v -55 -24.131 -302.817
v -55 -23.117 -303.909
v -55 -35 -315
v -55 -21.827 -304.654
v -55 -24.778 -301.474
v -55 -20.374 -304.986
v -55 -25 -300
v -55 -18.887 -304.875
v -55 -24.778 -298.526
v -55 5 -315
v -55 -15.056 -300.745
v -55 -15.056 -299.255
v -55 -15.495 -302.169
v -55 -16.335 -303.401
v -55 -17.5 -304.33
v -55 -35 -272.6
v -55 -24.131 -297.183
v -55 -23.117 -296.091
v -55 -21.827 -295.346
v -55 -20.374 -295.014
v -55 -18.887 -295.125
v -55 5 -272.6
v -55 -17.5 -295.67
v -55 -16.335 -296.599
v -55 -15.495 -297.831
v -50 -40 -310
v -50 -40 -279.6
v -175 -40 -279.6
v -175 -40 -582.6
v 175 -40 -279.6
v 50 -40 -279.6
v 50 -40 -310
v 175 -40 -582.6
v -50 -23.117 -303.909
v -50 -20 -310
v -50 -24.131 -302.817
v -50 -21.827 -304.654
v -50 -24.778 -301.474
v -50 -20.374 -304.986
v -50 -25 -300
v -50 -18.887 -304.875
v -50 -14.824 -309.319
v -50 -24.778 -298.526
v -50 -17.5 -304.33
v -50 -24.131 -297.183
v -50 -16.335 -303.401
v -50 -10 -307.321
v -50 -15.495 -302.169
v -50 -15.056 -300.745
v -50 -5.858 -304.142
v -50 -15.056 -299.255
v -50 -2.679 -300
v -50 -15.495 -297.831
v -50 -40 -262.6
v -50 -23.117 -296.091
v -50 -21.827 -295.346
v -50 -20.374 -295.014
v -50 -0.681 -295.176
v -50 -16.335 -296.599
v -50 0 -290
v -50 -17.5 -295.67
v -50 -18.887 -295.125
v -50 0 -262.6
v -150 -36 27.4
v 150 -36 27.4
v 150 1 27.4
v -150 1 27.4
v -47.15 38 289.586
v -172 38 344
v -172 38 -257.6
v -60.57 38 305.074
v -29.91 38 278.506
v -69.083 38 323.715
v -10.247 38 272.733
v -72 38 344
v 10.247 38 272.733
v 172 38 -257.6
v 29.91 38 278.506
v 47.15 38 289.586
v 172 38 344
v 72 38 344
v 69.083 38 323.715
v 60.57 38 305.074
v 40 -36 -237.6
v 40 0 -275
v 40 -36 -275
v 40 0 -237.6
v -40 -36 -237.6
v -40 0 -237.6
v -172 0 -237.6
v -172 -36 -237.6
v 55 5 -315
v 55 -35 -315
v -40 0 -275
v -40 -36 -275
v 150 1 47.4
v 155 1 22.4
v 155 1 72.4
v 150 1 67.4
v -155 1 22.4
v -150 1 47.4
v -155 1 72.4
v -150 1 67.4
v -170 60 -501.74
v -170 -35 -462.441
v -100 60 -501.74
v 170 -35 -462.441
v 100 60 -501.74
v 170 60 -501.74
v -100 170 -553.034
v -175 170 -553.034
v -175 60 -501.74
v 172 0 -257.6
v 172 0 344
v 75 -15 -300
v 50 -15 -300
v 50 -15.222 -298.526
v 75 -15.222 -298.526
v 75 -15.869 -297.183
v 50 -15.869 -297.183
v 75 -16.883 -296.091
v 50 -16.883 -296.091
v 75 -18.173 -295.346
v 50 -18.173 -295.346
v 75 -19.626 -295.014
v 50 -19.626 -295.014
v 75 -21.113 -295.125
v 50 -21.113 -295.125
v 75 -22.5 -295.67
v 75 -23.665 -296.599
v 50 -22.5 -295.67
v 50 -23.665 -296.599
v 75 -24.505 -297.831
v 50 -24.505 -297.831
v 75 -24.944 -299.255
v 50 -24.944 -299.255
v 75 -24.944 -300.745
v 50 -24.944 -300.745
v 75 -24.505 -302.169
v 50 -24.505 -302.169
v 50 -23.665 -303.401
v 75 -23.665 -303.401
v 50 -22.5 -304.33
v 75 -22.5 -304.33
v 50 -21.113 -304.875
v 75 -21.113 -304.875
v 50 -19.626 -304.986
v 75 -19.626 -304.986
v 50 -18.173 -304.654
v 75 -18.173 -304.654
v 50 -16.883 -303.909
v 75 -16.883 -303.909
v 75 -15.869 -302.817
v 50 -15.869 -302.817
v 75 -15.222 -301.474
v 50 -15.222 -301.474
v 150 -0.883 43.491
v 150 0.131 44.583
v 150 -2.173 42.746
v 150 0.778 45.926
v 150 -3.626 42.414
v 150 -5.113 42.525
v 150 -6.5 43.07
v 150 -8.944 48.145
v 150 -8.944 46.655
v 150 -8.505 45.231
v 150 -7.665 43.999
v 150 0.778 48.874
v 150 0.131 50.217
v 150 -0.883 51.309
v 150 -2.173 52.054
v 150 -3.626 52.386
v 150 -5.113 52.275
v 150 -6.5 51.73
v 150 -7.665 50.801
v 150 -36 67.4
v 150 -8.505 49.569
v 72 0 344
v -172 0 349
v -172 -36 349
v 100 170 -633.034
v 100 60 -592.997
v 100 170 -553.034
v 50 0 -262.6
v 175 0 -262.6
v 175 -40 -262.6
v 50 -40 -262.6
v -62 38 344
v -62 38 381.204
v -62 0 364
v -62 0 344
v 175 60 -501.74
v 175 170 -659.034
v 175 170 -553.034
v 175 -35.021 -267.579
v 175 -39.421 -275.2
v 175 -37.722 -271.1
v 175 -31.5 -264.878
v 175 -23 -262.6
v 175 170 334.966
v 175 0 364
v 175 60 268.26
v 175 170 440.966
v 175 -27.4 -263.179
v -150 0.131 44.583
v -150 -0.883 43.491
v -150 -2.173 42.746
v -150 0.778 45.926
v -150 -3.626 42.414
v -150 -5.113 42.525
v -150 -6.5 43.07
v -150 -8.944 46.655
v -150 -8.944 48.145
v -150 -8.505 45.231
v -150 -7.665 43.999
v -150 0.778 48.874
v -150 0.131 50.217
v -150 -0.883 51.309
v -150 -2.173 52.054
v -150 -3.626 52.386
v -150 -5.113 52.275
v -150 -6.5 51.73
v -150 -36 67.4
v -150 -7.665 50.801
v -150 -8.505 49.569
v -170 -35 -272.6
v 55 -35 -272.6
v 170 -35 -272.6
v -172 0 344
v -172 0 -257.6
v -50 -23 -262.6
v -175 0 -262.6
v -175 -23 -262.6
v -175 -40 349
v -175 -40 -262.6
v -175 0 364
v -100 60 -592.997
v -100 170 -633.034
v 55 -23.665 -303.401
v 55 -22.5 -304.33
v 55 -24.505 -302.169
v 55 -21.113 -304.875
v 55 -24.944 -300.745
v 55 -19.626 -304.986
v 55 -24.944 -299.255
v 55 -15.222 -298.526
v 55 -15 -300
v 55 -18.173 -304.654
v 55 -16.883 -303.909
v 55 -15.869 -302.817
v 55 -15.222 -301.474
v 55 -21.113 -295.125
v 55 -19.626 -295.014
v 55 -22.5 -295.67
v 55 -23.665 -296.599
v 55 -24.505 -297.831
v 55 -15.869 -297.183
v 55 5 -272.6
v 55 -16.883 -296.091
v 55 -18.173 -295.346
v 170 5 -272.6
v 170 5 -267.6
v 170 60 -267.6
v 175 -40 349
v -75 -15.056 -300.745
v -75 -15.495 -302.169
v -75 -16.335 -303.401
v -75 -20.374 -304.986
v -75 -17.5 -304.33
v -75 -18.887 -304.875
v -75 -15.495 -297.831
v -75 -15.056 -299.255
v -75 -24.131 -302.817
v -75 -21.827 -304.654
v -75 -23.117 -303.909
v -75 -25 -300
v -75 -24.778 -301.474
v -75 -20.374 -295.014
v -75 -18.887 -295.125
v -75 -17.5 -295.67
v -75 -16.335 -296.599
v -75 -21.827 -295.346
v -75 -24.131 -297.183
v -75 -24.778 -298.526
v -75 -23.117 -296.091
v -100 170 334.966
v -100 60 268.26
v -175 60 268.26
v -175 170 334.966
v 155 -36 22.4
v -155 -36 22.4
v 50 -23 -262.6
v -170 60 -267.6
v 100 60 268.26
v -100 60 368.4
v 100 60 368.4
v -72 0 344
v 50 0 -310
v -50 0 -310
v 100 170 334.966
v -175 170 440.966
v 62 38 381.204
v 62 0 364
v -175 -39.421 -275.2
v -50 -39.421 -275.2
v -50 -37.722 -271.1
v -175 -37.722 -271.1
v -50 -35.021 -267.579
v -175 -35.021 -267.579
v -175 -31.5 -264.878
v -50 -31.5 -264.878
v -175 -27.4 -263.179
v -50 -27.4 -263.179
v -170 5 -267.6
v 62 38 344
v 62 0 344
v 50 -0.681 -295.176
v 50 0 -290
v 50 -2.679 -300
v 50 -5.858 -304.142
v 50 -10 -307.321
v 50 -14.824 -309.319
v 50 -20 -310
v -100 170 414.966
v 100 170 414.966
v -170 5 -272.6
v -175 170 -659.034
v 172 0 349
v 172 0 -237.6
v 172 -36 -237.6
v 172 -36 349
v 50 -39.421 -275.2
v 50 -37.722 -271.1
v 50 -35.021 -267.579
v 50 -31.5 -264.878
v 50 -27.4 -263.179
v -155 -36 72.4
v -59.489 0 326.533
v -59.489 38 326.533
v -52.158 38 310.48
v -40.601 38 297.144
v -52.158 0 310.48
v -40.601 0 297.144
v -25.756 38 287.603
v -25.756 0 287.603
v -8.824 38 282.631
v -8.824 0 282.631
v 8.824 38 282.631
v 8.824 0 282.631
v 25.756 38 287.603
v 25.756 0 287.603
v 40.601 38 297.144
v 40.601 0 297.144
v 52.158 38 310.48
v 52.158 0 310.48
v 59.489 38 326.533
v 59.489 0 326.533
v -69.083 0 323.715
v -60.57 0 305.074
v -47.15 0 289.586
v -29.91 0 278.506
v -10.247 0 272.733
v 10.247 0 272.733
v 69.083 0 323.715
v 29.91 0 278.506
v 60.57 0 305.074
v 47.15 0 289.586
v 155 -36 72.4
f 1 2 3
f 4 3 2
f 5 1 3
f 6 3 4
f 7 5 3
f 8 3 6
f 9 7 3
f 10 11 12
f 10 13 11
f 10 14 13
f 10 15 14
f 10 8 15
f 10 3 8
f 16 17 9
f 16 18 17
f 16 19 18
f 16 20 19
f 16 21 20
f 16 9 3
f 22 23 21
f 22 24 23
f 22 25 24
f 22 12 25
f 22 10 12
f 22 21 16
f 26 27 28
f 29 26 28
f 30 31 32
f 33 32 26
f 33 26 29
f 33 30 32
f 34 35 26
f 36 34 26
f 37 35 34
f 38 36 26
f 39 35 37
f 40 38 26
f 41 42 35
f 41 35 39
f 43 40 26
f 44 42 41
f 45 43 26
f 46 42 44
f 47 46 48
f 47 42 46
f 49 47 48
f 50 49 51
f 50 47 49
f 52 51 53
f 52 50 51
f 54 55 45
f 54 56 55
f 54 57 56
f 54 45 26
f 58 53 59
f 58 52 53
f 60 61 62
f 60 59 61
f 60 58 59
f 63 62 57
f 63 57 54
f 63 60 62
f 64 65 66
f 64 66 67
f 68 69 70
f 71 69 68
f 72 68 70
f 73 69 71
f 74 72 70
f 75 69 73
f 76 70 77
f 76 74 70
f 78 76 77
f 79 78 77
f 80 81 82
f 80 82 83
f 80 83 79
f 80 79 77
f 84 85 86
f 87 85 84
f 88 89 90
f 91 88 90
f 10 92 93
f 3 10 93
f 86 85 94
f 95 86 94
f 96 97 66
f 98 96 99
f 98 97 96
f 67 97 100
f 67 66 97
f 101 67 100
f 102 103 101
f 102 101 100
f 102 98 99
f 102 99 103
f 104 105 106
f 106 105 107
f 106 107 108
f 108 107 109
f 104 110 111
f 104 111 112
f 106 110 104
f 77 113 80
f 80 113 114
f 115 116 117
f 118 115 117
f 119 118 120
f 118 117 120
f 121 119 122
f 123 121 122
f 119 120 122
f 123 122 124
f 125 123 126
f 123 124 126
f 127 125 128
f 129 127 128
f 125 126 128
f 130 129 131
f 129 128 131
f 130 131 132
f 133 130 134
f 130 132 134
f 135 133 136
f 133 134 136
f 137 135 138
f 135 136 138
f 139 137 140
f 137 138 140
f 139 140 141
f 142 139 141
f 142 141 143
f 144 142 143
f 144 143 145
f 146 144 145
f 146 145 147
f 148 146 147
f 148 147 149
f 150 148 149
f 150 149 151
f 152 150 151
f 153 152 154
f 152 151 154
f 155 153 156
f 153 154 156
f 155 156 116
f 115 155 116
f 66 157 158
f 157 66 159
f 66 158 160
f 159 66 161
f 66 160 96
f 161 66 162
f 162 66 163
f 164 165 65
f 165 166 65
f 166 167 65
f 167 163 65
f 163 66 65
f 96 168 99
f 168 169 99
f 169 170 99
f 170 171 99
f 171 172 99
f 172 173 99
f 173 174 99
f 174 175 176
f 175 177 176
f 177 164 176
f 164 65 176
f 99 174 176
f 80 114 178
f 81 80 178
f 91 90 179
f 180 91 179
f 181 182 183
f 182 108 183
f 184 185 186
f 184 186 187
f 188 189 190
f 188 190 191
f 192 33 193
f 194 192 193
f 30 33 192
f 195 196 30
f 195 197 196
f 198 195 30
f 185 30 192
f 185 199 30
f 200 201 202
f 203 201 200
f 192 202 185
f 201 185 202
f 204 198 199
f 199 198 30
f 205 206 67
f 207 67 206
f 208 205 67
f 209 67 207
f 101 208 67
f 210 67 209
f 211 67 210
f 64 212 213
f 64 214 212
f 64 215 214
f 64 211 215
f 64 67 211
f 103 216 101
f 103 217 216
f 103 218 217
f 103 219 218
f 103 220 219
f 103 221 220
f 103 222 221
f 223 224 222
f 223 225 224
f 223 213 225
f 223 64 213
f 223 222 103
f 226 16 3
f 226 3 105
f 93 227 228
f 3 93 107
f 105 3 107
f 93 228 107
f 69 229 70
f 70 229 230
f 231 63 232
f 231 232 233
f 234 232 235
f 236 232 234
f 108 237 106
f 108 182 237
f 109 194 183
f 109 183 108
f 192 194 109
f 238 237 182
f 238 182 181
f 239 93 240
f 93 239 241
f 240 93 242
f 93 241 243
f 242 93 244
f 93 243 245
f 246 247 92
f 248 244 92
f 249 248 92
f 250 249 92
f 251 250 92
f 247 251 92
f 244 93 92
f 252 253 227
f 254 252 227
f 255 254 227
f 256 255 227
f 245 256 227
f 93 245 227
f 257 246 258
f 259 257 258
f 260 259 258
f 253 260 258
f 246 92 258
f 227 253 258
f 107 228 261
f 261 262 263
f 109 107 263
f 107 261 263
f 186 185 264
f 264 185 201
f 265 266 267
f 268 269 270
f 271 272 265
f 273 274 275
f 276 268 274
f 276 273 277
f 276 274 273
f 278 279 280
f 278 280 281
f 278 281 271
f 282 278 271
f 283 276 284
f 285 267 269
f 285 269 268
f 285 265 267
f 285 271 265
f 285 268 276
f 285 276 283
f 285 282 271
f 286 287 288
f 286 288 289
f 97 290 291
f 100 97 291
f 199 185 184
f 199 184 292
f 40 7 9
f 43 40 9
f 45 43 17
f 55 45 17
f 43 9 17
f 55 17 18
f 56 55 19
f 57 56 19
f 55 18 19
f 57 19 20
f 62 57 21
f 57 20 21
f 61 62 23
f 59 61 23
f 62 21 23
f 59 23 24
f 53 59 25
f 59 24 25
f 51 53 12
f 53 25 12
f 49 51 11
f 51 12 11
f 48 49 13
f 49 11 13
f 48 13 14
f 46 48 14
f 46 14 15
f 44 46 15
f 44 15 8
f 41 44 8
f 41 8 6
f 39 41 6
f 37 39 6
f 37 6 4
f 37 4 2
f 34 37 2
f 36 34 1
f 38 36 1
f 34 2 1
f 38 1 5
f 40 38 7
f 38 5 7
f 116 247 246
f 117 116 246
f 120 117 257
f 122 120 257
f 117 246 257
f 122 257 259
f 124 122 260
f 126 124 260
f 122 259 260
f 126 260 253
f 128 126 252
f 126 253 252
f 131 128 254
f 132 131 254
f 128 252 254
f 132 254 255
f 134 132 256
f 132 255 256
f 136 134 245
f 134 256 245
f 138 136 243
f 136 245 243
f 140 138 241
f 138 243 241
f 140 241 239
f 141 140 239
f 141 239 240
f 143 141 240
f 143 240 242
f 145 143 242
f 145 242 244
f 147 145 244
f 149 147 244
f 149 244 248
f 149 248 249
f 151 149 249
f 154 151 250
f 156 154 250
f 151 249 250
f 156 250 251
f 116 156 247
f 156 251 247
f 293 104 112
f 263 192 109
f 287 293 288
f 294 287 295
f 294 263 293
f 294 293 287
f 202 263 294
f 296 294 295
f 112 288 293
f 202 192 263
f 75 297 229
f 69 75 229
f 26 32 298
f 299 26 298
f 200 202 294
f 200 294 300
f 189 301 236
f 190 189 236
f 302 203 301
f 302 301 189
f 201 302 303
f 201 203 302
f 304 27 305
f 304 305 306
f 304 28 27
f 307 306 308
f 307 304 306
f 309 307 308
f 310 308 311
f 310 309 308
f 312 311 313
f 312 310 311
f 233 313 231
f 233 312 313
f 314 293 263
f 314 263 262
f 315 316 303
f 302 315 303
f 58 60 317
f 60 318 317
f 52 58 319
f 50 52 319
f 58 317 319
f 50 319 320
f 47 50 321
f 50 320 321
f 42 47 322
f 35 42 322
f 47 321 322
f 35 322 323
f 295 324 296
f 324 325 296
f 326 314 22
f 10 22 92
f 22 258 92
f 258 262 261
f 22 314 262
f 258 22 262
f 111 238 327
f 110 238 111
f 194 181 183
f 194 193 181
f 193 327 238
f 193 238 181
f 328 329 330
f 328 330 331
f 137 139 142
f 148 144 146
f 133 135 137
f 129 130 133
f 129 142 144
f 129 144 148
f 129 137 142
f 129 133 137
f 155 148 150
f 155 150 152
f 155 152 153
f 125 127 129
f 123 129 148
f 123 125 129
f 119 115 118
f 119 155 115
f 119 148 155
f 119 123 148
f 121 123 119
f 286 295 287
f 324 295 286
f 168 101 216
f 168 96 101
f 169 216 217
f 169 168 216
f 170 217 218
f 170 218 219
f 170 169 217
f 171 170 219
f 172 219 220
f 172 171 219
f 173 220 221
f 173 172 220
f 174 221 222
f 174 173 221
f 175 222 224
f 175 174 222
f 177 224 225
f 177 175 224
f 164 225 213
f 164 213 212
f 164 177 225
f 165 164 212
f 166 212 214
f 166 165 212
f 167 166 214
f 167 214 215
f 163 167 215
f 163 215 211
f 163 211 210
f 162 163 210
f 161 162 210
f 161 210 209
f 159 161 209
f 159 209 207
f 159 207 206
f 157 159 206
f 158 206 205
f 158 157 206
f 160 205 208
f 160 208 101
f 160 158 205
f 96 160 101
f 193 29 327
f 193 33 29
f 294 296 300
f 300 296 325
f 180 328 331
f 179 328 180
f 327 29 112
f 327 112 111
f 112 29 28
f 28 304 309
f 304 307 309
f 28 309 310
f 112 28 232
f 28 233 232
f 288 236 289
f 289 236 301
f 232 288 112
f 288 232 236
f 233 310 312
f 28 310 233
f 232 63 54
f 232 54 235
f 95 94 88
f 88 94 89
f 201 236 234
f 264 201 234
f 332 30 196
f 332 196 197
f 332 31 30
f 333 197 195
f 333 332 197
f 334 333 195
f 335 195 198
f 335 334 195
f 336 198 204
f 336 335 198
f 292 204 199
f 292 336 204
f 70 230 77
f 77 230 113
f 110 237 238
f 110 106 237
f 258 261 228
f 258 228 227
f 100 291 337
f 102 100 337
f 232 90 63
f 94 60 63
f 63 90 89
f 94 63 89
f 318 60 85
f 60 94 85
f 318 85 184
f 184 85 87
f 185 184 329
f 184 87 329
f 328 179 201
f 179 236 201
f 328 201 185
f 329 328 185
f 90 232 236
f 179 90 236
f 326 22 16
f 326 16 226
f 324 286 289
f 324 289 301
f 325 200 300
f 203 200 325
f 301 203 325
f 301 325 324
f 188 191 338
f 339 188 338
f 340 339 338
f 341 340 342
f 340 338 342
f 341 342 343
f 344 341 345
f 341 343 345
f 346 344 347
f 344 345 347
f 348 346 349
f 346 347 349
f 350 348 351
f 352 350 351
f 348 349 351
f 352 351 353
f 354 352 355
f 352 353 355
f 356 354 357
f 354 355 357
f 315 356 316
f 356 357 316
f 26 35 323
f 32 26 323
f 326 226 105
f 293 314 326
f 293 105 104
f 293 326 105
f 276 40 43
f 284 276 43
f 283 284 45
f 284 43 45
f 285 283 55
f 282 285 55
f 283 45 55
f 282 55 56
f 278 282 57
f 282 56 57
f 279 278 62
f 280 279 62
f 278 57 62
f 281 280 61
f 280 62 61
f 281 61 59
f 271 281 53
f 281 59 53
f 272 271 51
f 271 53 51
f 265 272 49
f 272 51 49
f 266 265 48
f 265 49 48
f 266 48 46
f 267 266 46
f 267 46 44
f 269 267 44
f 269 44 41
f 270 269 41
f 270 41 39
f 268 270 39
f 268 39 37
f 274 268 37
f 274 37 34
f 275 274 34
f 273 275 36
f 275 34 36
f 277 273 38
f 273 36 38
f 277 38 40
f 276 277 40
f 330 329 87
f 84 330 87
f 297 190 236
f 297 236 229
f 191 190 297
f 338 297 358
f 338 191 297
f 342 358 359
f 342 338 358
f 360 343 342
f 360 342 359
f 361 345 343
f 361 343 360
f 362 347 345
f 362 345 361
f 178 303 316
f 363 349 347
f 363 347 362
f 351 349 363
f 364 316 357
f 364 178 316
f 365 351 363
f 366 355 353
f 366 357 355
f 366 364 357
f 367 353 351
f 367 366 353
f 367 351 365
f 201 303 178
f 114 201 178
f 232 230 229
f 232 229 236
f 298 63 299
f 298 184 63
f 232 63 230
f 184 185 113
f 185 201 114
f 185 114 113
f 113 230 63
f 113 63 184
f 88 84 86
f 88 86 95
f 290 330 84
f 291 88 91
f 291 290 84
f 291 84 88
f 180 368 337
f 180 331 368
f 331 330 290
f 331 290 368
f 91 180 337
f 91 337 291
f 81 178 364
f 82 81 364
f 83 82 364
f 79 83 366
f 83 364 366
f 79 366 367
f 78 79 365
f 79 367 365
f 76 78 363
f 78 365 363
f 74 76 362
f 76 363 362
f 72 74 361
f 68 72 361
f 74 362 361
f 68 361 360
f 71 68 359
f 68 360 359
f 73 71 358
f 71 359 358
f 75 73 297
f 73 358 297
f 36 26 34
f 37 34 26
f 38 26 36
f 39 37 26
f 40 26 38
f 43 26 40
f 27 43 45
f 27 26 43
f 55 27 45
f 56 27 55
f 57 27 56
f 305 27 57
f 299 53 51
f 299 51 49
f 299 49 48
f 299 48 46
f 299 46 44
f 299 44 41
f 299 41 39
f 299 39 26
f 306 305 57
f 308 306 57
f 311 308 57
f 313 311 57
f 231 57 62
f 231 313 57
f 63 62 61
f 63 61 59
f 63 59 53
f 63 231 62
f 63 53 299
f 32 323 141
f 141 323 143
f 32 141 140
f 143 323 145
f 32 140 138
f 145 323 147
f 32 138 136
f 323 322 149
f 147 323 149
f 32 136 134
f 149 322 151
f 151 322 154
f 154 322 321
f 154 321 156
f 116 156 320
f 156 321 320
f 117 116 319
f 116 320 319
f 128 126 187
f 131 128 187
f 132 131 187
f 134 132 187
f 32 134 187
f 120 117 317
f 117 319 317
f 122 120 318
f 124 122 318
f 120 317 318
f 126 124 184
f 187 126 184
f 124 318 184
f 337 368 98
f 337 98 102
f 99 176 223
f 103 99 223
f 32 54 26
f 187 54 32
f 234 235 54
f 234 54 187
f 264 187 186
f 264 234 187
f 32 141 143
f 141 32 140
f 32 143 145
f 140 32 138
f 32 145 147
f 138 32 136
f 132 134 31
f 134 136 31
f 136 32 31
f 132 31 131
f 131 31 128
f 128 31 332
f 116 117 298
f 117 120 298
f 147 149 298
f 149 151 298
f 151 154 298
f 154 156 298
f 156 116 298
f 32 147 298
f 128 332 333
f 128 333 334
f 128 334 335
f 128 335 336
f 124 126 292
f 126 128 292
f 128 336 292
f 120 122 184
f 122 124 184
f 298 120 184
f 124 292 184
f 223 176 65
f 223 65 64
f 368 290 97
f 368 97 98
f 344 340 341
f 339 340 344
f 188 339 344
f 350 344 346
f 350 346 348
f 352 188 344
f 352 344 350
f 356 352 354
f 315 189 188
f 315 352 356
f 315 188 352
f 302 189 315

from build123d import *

# Parameters (mm, degrees)
F0_W      = 350
F0_H      = 674
F1_DEPTH  = 40
F2_W      = 344
F2_H      = 586.6
F3_DEPTH  = 36
F4_W      = 310
F4_H      = 50
F4_W_2    = 300
F4_H_2    = 40
F5_DEPTH  = 37
F6_R      = 5
F7_DEPTH  = 150
F8_W      = 125
F8_H      = 80.1298069
F8_H_2    = 76.0073708534
F9_DEPTH  = 40.001
F10_R     = 20
F11_R     = 5
F12_DEPTH = 25
F13_R     = 5
F14_DEPTH = 25
F16_DEPTH = 350.001
F17_W     = 80
F17_H     = 79.4738833577
F18_DEPTH = 36
F20_DEPTH = 175
F22_DEPTH = 38
F24_DEPTH = 38
F26_DEPTH = 100
F27_W     = 40
F27_H     = 52.4
F28_DEPTH = 50
F30_DEPTH = 170
F31_W     = 115
F31_H     = 42.4
F32_DEPTH = 40
F33_R     = 5
F34_DEPTH = 5
F35_R     = 5
F36_DEPTH = 5
F37_R     = 17


with BuildPart() as f1:
    # F0 (on Front) → F1 (new body)
    with BuildSketch(Plane.XZ):
        with Locations((0, 27)):
            Rectangle(F0_W, F0_H)
    extrude(amount=F1_DEPTH)

    # F2 (on face) → F3 (cut)
    with BuildSketch(Plane(origin=(0, 0, 0), x_dir=(-1, 0, 0), z_dir=(0, 1, 0))):
        with Locations((0, 55.7)):
            Rectangle(F2_W, F2_H)
    extrude(amount=-F3_DEPTH, mode=Mode.SUBTRACT)

    # F4 (on face) → F5 (join)
    with BuildSketch(Plane(origin=(0, -36, 0), x_dir=(-1, 0, 0), z_dir=(0, 1, 0))):
        with Locations((0, 47.4)):
            Rectangle(F4_W, F4_H)
        with Locations((0, 47.4)):
            Rectangle(F4_W_2, F4_H_2, mode=Mode.SUBTRACT)
    extrude(amount=F5_DEPTH)

    # F6 (on Right) → F7 (join, symmetric)
    with BuildSketch(Plane.YZ):
        with Locations((-4, 47.4)):
            Circle(F6_R)
    extrude(amount=F7_DEPTH, both=True)

    # F8 (on face) → F9 (cut, through all)
    with BuildSketch(Plane(origin=(0, 0, 0), x_dir=(-1, 0, 0), z_dir=(0, 1, 0))):
        with Locations((-112.5, -302.66490345)):
            Rectangle(F8_W, F8_H)
        with Locations((112.5, -300.6036854267)):
            Rectangle(F8_W, F8_H_2)
    extrude(amount=-F9_DEPTH, mode=Mode.SUBTRACT)

    # F10
    f10_edges = [f1.edges().sort_by_distance(p)[0] for p in [
        (0, 0, -310),
    ]]
    fillet(f10_edges, radius=F10_R)

    # F11 (on face) → F12 (join)
    with BuildSketch(Plane.YZ.offset(50)):
        with Locations((-20, -300)):
            Circle(F11_R)
    extrude(amount=F12_DEPTH)

    # F13 (on face) → F14 (join)
    with BuildSketch(Plane(origin=(-50, 0, 0), x_dir=(0, -1, 0), z_dir=(-1, 0, 0))):
        with Locations((20, -300)):
            Circle(F13_R)
    extrude(amount=F14_DEPTH)

    # F15 (on face) → F16 (cut, through all)
    with BuildSketch(Plane(origin=(-175, 0, 0), x_dir=(0, -1, 0), z_dir=(-1, 0, 0))):
        Polygon((40, 364), (0, 364), (40, 349), align=None)
    extrude(amount=-F16_DEPTH, mode=Mode.SUBTRACT)

    # F17 (on face) → F18 (cut, through all)
    with BuildSketch(Plane(origin=(0, 0, 0), x_dir=(-1, 0, 0), z_dir=(0, 1, 0))):
        with Locations((0, -235.2630583211)):
            Rectangle(F17_W, F17_H)
    extrude(amount=-F18_DEPTH, mode=Mode.SUBTRACT)


with BuildPart() as f20:
    # F19 (on Right) → F20 (new body, symmetric)
    with BuildSketch(Plane.YZ):
        Polygon((-40, -582.6), (170, -659.0337491959), (170, -553.0337491959), (60, -501.7399067989), (60, 268.2600932011), (170, 334.9662508041), (170, 440.9662508041), (0, 364), (0, -262.6), (-40, -262.6), align=None)
    extrude(amount=F20_DEPTH, both=True)

    # F21 (on face) → F22 (cut)
    with BuildSketch(Plane.XZ):
        with BuildLine():
            Line((-72, 344), (-172, 344))
            Line((-172, 344), (-172, -257.6))
            Line((-172, -257.6), (172, -257.6))
            Line((172, -257.6), (172, 344))
            Line((172, 344), (72, 344))
            ThreePointArc((72, 344), (0, 272), (-72, 344))
        make_face()
    extrude(amount=-F22_DEPTH, mode=Mode.SUBTRACT)

    # F23 (on face) → F24 (cut)
    with BuildSketch(Plane.XZ):
        with BuildLine():
            Line((-62, 388.1143927574), (-62, 344))
            ThreePointArc((-62, 344), (0, 282), (62, 344))
            Line((62, 344), (62, 388.1143927574))
            Line((62, 388.1143927574), (-62, 388.1143927574))
        make_face()
    extrude(amount=-F24_DEPTH, mode=Mode.SUBTRACT)

    # F25 (on Right) → F26 (cut, symmetric)
    with BuildSketch(Plane.YZ):
        Polygon((170, -633.0337491959), (170, -553.0337491959), (170, -466.1389887333), (60, -501.7399067989), (60, -592.9970234266), align=None)
        Polygon((170, 334.9662508041), (170, 414.9662508041), (60, 368.399853225), (60, 268.2600932011), (170, 214.6935015917), align=None)
    extrude(amount=F26_DEPTH, both=True, mode=Mode.SUBTRACT)

    # F27 (on Right) → F28 (cut, symmetric)
    with BuildSketch(Plane.YZ):
        with Locations((-20, -283.8)):
            Rectangle(F27_W, F27_H)
    extrude(amount=F28_DEPTH, both=True, mode=Mode.SUBTRACT)

    # F29 (on Right) → F30 (cut, symmetric)
    with BuildSketch(Plane.YZ):
        Polygon((81.2916728854, -267.6), (5, -267.6), (5, -315), (-35, -315), (-35, -462.4406792741), (60, -501.7399067989), (81.2916728854, -331.8917108536), align=None)
    extrude(amount=F30_DEPTH, both=True, mode=Mode.SUBTRACT)

    # F31 (on face) → F32 (cut, through all)
    with BuildSketch(Plane(origin=(0, 5, 0), x_dir=(-1, 0, 0), z_dir=(0, 1, 0))):
        with Locations((-112.5, -293.8)):
            Rectangle(F31_W, F31_H)
        with Locations((112.5, -293.8)):
            Rectangle(F31_W, F31_H)
    extrude(amount=-F32_DEPTH, mode=Mode.SUBTRACT)

    # F33 (on face) → F34 (cut)
    with BuildSketch(Plane.YZ.offset(55)):
        with Locations((-20, -300)):
            Circle(F33_R)
    extrude(amount=-F34_DEPTH, mode=Mode.SUBTRACT)

    # F35 (on face) → F36 (cut)
    with BuildSketch(Plane(origin=(-55, 0, 0), x_dir=(0, -1, 0), z_dir=(-1, 0, 0))):
        with Locations((20, -300)):
            Circle(F35_R)
    extrude(amount=-F36_DEPTH, mode=Mode.SUBTRACT)

    # F37
    f37_edges = [f20.edges().sort_by_distance(p)[0] for p in [
        (-112.5, -40, -262.6),
        (112.5, -40, -262.6),
    ]]
    fillet(f37_edges, radius=F37_R)


solid = Compound([f1.part, f20.part])
